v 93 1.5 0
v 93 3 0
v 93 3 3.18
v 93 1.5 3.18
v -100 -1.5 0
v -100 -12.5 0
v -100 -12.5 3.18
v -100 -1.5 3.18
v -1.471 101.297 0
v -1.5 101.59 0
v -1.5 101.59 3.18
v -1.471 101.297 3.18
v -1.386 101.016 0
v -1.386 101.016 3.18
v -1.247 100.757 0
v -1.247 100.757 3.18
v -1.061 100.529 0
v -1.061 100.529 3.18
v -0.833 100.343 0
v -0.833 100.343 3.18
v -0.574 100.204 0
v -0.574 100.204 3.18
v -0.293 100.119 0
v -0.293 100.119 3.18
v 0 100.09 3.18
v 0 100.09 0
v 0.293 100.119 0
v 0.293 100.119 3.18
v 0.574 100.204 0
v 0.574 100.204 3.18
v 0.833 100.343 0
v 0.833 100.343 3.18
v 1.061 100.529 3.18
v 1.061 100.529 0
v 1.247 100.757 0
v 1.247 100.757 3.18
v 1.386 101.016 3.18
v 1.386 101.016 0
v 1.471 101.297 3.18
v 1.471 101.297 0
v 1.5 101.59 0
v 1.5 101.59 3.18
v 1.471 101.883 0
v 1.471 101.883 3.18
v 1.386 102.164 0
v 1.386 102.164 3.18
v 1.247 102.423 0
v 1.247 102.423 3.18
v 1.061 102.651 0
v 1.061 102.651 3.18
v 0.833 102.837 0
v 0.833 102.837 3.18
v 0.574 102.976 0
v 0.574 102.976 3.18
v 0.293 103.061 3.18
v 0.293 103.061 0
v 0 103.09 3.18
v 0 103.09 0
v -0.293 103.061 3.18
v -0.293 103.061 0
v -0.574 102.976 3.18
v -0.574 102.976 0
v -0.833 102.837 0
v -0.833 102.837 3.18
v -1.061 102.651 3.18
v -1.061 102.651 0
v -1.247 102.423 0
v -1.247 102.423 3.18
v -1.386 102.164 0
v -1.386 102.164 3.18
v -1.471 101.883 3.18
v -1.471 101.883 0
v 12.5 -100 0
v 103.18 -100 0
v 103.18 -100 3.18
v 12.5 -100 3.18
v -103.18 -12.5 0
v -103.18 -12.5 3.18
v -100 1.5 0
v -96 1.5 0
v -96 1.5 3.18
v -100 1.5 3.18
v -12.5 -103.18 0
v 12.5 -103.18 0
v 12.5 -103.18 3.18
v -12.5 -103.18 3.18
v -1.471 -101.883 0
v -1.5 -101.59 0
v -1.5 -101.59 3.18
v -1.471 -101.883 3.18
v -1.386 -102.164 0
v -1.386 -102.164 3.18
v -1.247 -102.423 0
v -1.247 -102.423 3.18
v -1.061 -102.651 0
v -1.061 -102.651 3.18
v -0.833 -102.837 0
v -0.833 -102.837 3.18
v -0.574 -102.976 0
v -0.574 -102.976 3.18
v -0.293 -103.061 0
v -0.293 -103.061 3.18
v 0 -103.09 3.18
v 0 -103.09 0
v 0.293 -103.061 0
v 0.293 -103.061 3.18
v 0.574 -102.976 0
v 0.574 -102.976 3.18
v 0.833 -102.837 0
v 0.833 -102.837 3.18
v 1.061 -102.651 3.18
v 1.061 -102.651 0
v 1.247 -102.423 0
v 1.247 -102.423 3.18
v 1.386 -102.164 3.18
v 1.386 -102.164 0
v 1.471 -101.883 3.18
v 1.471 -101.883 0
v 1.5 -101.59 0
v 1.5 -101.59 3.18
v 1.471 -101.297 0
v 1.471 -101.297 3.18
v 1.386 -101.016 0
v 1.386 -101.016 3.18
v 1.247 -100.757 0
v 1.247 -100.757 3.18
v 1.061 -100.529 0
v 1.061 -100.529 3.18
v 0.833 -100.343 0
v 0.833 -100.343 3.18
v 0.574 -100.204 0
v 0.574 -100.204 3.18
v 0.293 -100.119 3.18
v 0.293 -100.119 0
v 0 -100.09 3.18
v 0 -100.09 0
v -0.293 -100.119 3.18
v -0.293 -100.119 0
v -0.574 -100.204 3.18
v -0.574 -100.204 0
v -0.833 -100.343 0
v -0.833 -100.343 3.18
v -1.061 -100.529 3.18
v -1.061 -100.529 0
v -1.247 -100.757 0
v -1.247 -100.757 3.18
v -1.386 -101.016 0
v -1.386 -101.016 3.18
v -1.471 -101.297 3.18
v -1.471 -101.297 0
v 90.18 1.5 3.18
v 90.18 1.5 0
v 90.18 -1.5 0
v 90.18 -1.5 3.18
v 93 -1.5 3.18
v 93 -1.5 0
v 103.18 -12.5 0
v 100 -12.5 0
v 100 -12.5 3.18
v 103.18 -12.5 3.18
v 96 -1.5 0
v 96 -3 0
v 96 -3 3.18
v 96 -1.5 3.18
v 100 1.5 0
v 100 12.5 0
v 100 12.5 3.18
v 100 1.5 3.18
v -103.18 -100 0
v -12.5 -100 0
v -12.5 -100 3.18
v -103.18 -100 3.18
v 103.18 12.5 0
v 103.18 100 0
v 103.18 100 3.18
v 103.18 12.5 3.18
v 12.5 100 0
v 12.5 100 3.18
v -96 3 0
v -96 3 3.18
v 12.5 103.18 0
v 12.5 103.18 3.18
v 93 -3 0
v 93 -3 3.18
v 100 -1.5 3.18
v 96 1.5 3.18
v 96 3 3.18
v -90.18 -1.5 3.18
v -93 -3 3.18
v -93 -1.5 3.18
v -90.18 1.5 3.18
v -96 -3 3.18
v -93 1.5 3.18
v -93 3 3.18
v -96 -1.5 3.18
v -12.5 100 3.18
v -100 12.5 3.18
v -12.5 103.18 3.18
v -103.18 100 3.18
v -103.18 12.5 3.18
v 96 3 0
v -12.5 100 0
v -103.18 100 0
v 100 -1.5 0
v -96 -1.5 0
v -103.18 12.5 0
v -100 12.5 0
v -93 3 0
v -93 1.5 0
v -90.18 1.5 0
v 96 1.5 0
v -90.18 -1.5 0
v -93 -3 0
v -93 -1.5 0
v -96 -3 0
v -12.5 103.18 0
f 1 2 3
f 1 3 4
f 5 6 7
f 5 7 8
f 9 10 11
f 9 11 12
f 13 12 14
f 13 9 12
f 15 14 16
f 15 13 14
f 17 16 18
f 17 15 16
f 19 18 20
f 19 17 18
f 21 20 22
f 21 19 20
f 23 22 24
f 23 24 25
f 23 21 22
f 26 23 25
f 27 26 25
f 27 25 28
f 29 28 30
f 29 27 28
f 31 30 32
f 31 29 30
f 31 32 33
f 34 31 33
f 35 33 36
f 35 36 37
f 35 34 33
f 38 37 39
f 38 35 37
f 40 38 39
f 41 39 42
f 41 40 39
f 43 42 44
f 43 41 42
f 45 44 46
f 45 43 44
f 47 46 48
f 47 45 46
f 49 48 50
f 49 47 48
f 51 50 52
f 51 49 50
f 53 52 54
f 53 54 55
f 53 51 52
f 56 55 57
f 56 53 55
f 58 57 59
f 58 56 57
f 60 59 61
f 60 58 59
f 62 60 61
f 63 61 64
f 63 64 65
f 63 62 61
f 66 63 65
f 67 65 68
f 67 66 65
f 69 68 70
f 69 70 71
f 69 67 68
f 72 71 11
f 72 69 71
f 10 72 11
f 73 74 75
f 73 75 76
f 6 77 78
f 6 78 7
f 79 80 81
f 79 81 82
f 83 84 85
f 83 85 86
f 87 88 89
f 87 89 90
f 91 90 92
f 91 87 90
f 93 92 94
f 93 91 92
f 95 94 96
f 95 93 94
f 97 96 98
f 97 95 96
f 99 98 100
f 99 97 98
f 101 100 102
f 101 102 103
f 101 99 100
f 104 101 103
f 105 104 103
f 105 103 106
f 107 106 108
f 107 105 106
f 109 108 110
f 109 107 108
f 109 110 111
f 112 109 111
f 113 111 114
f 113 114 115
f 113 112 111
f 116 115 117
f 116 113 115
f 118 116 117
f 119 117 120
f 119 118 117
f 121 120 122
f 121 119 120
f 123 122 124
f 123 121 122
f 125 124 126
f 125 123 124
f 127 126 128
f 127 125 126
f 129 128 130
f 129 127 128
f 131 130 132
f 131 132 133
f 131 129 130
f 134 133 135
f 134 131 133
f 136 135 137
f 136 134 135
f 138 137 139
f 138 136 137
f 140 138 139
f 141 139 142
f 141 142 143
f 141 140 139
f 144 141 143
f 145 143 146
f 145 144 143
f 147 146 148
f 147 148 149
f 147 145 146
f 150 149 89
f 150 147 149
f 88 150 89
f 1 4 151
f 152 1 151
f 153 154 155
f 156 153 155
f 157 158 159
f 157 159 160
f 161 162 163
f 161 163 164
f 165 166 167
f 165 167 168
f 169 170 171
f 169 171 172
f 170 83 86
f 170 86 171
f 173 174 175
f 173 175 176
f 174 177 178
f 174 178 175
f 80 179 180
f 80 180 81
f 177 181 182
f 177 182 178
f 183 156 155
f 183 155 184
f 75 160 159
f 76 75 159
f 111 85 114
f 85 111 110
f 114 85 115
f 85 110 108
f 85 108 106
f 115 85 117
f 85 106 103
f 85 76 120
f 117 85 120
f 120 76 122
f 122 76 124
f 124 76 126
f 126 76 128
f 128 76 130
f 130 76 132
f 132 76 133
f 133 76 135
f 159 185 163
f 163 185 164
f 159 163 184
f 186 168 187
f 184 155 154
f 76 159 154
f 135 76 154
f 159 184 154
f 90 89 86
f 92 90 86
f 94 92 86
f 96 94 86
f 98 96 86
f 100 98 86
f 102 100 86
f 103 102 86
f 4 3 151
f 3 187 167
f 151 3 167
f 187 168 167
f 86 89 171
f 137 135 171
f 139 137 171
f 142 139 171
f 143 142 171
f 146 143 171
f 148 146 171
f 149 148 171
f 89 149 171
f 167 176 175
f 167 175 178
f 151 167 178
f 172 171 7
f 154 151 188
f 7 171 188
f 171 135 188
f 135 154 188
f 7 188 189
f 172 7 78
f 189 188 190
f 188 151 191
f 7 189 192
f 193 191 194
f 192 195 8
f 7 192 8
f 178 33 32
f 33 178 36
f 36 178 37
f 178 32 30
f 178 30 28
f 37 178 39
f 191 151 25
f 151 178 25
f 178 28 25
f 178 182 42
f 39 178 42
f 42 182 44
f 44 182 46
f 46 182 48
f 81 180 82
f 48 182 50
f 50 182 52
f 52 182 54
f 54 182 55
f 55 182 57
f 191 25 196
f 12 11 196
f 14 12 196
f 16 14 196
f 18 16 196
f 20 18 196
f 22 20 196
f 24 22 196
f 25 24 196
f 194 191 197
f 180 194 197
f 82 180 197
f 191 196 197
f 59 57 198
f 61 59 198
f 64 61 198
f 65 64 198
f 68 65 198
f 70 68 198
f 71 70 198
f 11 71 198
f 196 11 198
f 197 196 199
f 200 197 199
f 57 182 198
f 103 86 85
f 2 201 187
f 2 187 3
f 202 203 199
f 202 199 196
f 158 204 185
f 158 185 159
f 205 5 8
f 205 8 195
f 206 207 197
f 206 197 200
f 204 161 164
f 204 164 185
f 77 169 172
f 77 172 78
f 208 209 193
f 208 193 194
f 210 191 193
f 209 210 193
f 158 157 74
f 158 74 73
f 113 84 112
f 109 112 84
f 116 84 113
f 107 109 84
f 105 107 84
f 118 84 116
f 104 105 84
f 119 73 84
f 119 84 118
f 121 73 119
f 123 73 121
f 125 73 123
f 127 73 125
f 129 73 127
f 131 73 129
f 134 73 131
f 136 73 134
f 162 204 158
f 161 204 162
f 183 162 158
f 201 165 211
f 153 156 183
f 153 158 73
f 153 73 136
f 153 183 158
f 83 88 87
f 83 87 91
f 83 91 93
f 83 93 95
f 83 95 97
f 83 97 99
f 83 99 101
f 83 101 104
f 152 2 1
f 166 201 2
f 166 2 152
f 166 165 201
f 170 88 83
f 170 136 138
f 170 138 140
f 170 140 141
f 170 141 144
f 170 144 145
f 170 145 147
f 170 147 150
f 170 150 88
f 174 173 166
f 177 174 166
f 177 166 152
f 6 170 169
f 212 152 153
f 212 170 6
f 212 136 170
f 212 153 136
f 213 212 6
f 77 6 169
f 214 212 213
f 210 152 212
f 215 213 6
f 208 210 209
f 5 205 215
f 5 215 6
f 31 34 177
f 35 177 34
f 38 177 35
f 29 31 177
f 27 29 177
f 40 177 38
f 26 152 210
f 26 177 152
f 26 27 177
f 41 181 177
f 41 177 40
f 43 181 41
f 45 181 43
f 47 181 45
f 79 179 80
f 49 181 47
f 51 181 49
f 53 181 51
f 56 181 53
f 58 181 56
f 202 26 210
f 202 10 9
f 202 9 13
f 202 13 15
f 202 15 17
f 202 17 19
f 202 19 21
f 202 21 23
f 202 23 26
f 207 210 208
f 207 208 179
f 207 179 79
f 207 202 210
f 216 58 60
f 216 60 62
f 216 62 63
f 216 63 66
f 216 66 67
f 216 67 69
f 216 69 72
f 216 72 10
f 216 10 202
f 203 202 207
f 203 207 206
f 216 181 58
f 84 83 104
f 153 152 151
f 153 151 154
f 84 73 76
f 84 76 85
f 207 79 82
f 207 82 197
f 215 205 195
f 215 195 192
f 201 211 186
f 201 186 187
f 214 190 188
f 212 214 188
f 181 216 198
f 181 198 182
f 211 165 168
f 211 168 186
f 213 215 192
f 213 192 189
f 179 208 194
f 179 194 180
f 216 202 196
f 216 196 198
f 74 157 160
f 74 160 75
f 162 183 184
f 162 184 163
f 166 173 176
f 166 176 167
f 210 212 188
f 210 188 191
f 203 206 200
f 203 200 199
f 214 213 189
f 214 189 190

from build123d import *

# Parameters (mm, degrees)
SKETCH1_R           = 1.5
BOSS_EXTRUDE1_DEPTH = 3.18


with BuildPart() as part:
    # Sketch1 → Boss-Extrude1 (new body)
    with BuildSketch(Plane.XY):
        Polygon((-103.18, 100), (-12.5, 100), (-12.5, 103.18), (12.5, 103.18), (12.5, 100), (103.18, 100), (103.18, 12.5), (100, 12.5), (100, 1.5), (96, 1.5), (96, 3), (93, 3), (93, 1.5), (90.18, 1.5), (90.18, -1.5), (93, -1.5), (93, -3), (96, -3), (96, -1.5), (100, -1.5), (100, -12.5), (103.18, -12.5), (103.18, -100), (12.5, -100), (12.5, -103.18), (-12.5, -103.18), (-12.5, -100), (-103.18, -100), (-103.18, -12.5), (-100, -12.5), (-100, -1.5), (-96, -1.5), (-96, -3), (-93, -3), (-93, -1.5), (-90.18, -1.5), (-90.18, 1.5), (-93, 1.5), (-93, 3), (-96, 3), (-96, 1.5), (-100, 1.5), (-100, 12.5), (-103.18, 12.5), align=None)
        with Locations(Location((0, -101.59, 0), (0, 0, 180))):
            Circle(SKETCH1_R, mode=Mode.SUBTRACT)
        with Locations(Location((0, 101.59, 0), (0, 0, 180))):
            Circle(SKETCH1_R, mode=Mode.SUBTRACT)
    extrude(amount=BOSS_EXTRUDE1_DEPTH)


solid = part.part
